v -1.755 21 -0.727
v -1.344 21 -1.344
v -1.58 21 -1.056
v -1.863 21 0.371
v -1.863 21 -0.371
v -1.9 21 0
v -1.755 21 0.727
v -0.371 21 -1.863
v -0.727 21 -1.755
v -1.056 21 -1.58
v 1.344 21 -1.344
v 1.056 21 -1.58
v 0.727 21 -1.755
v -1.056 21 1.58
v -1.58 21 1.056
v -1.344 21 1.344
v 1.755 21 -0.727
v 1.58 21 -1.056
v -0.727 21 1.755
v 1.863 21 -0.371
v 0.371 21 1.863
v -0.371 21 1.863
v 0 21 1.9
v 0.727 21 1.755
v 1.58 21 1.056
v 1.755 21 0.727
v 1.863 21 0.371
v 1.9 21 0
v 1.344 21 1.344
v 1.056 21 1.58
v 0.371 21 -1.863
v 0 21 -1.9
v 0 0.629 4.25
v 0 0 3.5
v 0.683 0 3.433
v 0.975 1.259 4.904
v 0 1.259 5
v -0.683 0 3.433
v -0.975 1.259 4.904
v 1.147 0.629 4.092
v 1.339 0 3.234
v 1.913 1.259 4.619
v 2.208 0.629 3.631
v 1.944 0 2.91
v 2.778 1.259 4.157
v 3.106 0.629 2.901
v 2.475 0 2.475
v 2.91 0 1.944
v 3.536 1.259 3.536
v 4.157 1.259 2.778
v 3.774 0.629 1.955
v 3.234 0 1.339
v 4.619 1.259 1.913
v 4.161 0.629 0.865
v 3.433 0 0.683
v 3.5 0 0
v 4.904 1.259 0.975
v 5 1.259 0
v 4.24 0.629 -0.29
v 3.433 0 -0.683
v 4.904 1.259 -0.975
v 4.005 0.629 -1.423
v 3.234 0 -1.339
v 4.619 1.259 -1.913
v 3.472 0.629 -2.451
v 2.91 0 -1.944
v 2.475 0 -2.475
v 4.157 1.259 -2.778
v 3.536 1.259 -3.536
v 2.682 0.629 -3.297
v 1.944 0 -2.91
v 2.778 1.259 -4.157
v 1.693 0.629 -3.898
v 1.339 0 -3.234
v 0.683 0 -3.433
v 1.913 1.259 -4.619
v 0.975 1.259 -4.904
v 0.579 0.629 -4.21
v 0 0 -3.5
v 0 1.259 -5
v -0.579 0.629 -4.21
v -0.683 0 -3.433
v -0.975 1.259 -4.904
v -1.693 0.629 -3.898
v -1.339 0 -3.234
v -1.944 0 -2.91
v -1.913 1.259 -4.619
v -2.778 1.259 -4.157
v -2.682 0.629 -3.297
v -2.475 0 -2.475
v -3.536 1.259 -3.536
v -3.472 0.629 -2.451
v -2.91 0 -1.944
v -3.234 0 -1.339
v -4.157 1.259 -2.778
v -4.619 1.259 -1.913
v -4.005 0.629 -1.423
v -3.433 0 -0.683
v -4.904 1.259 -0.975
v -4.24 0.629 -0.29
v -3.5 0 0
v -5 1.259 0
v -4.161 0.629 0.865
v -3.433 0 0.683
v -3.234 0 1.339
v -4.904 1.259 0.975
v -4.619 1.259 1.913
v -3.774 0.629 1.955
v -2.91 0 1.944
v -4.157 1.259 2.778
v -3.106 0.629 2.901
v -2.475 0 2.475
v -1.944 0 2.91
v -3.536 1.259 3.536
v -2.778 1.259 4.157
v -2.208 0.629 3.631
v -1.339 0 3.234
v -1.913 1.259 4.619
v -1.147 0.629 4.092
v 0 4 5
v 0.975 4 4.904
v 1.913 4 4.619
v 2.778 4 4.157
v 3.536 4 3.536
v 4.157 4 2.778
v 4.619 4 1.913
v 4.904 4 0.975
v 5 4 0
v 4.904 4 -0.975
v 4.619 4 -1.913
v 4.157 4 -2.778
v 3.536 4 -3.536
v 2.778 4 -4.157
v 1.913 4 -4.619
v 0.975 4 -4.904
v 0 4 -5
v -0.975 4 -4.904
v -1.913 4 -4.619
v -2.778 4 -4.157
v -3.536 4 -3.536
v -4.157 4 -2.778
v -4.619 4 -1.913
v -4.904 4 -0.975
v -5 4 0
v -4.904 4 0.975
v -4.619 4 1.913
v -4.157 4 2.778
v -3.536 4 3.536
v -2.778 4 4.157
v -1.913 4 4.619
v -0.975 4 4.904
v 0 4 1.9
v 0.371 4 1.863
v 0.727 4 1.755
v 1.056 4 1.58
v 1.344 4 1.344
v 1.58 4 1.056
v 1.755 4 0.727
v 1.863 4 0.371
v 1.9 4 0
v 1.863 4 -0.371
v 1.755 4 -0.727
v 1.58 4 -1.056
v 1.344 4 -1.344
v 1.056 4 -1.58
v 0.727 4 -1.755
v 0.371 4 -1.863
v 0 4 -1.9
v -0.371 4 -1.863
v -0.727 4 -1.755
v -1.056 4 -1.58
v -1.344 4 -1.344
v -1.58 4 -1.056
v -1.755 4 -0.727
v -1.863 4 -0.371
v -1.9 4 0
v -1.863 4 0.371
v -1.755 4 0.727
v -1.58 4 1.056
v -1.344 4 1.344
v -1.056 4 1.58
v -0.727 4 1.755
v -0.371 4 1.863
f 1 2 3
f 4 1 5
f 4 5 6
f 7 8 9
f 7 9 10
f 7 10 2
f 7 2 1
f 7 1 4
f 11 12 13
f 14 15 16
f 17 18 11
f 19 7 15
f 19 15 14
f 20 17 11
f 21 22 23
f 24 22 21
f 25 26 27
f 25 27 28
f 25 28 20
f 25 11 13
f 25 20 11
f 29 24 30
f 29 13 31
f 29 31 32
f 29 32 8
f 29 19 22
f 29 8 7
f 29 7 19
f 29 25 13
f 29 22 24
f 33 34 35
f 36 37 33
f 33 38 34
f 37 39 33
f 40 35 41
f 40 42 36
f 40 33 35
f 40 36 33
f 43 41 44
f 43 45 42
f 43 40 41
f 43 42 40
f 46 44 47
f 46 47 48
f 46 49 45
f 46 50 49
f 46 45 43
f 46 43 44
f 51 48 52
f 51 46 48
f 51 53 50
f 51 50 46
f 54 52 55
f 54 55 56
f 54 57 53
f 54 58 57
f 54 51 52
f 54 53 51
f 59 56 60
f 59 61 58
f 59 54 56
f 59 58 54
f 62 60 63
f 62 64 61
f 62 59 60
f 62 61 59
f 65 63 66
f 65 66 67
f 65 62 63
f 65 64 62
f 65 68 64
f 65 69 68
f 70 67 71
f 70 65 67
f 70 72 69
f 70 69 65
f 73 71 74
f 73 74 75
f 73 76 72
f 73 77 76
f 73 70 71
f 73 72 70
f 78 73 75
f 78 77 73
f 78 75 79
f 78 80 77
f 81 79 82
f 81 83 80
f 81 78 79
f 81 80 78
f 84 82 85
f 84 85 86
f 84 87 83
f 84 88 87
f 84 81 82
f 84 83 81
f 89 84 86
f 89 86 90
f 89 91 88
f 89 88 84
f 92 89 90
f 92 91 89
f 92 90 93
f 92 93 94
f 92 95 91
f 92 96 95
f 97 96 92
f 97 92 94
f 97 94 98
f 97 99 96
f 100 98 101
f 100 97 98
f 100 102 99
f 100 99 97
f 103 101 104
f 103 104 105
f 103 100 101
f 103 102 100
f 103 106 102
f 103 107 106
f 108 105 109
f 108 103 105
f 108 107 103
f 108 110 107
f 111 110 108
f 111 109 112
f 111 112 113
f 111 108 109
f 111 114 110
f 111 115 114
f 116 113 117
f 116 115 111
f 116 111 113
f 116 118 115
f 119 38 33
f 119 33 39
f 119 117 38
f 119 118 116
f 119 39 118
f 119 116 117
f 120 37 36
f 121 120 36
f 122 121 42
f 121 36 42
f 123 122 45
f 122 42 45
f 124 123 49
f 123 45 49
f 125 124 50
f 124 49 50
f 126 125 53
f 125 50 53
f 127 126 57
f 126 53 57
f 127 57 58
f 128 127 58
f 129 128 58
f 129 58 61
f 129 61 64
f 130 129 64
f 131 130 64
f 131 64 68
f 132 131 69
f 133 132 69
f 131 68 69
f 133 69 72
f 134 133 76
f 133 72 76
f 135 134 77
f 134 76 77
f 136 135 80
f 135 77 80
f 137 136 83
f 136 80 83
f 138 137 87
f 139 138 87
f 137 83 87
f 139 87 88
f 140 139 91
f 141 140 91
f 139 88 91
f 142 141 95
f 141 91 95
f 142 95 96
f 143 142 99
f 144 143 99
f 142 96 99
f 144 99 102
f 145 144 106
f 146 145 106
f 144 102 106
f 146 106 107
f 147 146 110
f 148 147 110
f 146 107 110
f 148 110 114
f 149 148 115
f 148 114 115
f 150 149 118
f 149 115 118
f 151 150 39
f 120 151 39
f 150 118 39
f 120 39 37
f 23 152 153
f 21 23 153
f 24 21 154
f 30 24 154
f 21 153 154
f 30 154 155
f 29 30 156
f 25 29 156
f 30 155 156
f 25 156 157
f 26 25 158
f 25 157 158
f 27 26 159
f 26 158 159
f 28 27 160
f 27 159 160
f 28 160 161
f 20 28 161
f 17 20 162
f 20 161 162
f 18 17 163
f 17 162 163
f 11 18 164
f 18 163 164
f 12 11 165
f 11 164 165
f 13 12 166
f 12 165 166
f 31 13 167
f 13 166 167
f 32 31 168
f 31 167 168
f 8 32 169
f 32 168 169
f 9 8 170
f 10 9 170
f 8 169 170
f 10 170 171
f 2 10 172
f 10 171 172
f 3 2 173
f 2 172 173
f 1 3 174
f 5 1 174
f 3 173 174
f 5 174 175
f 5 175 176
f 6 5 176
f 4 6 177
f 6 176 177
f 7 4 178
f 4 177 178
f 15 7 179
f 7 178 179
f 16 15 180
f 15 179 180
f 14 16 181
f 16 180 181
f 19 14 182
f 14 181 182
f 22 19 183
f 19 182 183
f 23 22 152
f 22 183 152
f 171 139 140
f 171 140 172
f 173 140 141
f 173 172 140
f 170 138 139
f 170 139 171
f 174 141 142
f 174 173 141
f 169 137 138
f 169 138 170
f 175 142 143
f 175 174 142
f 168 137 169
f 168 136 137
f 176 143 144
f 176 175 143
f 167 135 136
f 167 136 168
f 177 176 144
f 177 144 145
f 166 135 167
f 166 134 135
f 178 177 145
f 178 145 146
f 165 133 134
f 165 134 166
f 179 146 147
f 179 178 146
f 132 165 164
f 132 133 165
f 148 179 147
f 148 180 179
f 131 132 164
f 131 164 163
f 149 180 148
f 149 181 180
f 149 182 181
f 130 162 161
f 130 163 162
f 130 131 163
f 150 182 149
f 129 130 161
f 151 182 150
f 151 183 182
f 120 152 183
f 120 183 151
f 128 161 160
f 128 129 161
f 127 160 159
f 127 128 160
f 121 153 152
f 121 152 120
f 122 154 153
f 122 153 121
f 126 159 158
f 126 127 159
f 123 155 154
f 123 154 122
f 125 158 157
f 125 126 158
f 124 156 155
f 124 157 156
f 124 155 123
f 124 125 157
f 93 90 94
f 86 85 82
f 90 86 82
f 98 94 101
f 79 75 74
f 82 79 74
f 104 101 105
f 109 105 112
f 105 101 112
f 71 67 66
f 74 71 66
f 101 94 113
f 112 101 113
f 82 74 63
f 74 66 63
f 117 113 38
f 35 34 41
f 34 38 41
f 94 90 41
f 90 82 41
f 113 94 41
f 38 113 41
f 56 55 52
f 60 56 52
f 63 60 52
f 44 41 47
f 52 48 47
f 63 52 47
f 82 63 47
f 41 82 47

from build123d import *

# Parameters (mm, degrees)
SKETCH1_R           = 5
BOSS_EXTRUDE1_DEPTH = 4
SKETCH2_R           = 1.9
BOSS_EXTRUDE2_DEPTH = 17
CHAMFER1_SIZE       = 1.5
CHAMFER1_SIZE2      = 1.258649447


with BuildPart() as part:
    # Sketch1 → Boss-Extrude1 (new body)
    with BuildSketch(Plane(origin=(0, 0, 0), x_dir=(1, 0, 0), z_dir=(0, 1, 0))):
        with Locations(Location((0, 0, 0), (0, 0, 270))):
            Circle(SKETCH1_R)
    extrude(amount=BOSS_EXTRUDE1_DEPTH)

    # Sketch2 → Boss-Extrude2 (add)
    with BuildSketch(Plane(origin=(0, 4, 0), x_dir=(1, 0, 0), z_dir=(0, 1, 0))):
        with Locations(Location((0, 0, 0), (0, 0, 270))):
            Circle(SKETCH2_R)
    extrude(amount=BOSS_EXTRUDE2_DEPTH)

    # Chamfer1
    chamfer1_edges = [part.edges().sort_by_distance(p)[0] for p in [
        (0, 0, -5),
    ]]
    chamfer1_side = [part.faces().sort_by_distance(p)[0] for p in [
        (0, 0, 0),
    ]]
    chamfer(chamfer1_edges, length=CHAMFER1_SIZE, length2=CHAMFER1_SIZE2, reference=chamfer1_side[0])


solid = part.part
